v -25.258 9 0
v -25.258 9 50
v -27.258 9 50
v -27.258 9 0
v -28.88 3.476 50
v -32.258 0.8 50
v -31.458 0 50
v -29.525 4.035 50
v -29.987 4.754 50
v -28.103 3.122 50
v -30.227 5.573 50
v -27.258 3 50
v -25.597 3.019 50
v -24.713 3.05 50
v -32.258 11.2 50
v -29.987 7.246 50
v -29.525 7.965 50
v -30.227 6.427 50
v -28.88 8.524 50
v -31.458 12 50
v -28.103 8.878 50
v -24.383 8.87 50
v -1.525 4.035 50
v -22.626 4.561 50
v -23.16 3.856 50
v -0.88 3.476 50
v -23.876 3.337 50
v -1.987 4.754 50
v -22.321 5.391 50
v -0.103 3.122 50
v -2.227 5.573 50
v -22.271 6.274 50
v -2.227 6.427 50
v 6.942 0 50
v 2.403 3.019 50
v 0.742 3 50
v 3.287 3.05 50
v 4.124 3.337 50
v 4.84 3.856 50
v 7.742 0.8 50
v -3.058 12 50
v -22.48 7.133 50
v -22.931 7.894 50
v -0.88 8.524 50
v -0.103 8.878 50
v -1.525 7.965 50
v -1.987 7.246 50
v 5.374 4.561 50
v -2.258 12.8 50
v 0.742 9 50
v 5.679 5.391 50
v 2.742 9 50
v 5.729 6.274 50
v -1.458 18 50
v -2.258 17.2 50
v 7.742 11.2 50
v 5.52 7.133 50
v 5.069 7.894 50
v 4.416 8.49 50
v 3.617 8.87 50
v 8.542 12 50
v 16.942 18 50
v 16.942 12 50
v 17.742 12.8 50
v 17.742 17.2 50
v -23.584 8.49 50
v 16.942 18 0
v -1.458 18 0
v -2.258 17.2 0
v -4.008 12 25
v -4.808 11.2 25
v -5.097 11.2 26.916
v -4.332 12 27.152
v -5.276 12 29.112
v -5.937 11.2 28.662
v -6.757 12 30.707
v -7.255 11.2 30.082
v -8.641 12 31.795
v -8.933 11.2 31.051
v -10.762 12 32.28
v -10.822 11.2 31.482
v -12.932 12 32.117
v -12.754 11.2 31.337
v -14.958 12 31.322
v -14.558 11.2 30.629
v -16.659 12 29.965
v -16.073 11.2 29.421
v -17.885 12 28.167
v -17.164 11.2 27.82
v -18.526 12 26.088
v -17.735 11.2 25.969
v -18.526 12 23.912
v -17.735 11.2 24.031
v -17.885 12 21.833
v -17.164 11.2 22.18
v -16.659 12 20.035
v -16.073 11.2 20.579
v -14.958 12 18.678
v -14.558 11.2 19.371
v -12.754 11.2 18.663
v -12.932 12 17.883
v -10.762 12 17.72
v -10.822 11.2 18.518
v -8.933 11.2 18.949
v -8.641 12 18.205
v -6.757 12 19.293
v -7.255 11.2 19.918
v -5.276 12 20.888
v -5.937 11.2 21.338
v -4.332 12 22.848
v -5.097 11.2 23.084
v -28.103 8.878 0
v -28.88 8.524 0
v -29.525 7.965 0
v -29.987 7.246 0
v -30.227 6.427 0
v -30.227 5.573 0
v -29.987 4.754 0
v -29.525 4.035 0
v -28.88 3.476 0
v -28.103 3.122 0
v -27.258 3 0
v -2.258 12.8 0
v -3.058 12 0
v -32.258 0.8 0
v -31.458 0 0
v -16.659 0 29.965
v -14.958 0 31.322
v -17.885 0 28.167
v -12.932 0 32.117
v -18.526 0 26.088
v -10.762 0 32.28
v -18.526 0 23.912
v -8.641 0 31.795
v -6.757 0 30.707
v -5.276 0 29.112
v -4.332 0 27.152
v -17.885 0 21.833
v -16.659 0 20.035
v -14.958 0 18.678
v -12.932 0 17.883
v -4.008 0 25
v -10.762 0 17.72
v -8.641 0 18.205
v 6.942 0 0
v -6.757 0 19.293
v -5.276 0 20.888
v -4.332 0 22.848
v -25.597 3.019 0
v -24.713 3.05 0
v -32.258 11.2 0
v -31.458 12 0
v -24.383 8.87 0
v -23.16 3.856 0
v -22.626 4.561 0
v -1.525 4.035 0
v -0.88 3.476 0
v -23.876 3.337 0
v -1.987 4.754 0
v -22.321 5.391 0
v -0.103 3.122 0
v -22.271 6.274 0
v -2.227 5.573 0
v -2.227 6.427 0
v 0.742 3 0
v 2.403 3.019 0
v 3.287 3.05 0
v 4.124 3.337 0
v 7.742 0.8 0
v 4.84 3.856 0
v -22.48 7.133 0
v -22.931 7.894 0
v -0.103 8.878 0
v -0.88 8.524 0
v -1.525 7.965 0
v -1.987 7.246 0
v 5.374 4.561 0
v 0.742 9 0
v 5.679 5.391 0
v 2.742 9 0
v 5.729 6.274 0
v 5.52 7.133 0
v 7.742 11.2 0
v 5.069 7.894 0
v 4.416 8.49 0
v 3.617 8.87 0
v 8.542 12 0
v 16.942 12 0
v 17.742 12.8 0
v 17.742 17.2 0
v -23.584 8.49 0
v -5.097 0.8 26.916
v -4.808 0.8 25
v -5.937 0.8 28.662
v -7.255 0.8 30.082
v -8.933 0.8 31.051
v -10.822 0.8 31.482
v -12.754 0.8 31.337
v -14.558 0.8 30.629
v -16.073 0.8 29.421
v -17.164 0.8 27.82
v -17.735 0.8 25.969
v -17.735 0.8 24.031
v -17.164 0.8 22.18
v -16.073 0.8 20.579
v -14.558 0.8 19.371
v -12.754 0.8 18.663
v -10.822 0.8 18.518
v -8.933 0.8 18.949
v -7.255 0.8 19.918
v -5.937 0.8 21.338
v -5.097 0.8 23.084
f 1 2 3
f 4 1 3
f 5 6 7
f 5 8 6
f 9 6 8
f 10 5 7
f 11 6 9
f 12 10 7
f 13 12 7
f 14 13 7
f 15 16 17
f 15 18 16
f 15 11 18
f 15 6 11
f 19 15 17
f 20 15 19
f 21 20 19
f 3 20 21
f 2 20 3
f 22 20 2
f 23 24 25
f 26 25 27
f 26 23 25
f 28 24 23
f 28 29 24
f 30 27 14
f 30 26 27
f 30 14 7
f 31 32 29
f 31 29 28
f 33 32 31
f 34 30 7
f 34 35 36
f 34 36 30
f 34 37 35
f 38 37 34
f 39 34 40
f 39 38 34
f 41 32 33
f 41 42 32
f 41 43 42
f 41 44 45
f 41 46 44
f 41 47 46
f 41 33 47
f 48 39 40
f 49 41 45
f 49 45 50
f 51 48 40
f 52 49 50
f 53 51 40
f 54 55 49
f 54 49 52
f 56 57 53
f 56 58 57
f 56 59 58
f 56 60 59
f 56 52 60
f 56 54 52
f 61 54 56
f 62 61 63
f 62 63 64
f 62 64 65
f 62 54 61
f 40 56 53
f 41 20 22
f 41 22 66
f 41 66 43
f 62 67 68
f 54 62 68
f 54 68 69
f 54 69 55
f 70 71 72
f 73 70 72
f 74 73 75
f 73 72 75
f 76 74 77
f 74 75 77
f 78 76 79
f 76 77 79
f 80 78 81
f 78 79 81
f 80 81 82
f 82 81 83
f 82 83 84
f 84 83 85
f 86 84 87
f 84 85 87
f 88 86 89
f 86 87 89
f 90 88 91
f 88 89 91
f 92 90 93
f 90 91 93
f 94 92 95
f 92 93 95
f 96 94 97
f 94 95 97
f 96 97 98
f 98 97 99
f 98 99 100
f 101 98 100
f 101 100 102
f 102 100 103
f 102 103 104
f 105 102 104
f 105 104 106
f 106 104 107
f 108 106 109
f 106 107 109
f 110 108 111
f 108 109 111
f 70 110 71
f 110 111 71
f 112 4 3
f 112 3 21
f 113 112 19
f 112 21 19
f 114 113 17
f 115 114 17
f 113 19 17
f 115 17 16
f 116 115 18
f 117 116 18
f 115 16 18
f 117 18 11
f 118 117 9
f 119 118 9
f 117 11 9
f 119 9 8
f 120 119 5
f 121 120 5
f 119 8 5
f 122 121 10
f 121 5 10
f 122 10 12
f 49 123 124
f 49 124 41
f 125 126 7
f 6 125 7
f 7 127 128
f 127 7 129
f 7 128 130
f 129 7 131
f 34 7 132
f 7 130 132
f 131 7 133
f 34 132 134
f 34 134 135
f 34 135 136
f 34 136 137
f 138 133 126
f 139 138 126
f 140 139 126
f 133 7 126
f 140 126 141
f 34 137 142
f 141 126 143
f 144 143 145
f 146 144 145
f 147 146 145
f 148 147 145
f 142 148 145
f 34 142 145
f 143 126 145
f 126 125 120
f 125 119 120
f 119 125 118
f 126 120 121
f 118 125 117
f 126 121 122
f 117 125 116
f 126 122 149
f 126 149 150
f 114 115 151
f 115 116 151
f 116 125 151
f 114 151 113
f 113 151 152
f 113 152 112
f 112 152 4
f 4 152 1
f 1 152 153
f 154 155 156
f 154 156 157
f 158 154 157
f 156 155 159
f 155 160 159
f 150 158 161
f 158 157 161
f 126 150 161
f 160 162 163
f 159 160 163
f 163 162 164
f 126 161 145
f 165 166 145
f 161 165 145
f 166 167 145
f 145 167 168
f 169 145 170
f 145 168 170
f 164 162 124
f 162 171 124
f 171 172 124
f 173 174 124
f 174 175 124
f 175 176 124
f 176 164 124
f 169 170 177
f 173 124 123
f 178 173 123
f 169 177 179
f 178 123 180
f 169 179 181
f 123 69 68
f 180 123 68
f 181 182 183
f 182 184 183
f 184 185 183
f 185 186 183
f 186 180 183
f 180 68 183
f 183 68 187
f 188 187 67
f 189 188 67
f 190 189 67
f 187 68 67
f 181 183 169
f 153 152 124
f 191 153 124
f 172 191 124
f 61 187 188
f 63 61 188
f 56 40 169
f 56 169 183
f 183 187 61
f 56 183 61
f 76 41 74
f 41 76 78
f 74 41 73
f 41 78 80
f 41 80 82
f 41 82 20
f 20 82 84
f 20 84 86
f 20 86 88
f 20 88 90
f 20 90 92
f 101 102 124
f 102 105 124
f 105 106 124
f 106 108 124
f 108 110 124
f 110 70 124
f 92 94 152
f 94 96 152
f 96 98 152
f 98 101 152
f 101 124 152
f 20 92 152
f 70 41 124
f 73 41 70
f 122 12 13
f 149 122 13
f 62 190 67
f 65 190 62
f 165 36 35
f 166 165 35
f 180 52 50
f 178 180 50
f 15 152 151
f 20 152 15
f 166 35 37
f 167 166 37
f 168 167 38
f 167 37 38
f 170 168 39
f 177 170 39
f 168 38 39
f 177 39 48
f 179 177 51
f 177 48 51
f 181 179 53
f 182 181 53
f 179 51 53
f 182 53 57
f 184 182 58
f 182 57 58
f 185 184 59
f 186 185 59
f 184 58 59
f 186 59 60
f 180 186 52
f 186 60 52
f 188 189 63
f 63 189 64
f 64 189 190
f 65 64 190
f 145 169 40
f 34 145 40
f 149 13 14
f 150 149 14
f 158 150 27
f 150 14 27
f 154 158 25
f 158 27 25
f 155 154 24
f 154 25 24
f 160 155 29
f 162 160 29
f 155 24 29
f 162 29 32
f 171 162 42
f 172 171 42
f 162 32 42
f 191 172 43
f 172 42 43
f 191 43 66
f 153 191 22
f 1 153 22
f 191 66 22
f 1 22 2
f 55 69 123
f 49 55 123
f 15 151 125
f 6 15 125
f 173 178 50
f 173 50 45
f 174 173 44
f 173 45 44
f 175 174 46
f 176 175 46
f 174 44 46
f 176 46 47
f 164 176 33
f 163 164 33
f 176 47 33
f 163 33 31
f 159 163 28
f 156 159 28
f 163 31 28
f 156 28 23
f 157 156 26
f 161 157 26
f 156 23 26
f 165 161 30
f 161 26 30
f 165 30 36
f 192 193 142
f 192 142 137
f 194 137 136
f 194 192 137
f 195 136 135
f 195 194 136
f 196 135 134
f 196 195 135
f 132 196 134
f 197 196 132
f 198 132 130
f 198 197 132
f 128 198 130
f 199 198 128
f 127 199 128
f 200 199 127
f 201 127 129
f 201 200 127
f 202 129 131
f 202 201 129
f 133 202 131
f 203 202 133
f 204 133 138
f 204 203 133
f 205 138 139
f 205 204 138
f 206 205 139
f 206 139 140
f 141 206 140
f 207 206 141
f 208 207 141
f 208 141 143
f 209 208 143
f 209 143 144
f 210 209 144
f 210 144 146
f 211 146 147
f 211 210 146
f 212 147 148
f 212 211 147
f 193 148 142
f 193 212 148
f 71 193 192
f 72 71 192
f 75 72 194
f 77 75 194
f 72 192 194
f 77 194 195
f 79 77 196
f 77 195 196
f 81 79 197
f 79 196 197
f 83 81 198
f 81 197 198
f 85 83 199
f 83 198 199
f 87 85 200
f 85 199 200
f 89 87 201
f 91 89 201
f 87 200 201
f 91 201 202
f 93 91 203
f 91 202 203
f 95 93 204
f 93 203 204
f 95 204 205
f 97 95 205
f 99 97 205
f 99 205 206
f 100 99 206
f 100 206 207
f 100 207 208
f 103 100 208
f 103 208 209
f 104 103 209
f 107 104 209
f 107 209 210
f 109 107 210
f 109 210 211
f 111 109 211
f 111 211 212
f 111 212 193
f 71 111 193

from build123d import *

# Parameters (mm, degrees)
F1_DEPTH = 50
F3_DEPTH = 55
F4_R     = 6.5
F5_DEPTH = 13
F6_SIZE  = 0.8


with BuildPart() as f1:
    # F0 (on Top) → F1 (new body)
    with BuildSketch(Plane.XY):
        Polygon((-32.258, 12), (-32.258, 0), (7.742, 0), (7.742, 12), (17.742, 12), (17.742, 18), (-2.258, 18), (-2.258, 12), align=None)
    extrude(amount=F1_DEPTH)

    # F2 (on face) → F3 (cut)
    with BuildSketch(Plane.XY.offset(50)):
        with BuildLine():
            Line((-25.258, 9), (-27.258, 9))
            ThreePointArc((-27.258, 9), (-30.258, 6), (-27.258, 3))
            Line((-27.258, 3), (-25.596914, 3.019205))
            ThreePointArc((-25.596914, 3.019205), (-22.262805, 5.830271), (-25.258, 9))
        make_face()
        with BuildLine():
            Line((0.742, 3), (2.403086, 3.019205))
            ThreePointArc((2.403086, 3.019205), (5.737195, 5.830271), (2.742, 9))
            Line((2.742, 9), (0.742, 9))
            ThreePointArc((0.742, 9), (-2.258, 6), (0.742, 3))
        make_face()
    extrude(amount=-F3_DEPTH, mode=Mode.SUBTRACT)

    # F4 (on face) → F5 (cut)
    with BuildSketch(Plane.XZ):
        with Locations((-11.308, 25)):
            Circle(F4_R)
    extrude(amount=-F5_DEPTH, mode=Mode.SUBTRACT)

    # F6
    f6_edges = [f1.edges().sort_by_distance(p)[0] for p in [
        (7.742, 0, 25),
        (7.742, 12, 25),
        (17.742, 12, 25),
        (17.742, 18, 25),
        (-32.258, 12, 25),
        (-32.258, 0, 25),
        (-2.258, 12, 25),
        (-2.258, 18, 25),
        (-17.808, 12, 25),
        (-17.808, 0, 25),
    ]]
    chamfer(f6_edges, length=F6_SIZE)


solid = f1.part
